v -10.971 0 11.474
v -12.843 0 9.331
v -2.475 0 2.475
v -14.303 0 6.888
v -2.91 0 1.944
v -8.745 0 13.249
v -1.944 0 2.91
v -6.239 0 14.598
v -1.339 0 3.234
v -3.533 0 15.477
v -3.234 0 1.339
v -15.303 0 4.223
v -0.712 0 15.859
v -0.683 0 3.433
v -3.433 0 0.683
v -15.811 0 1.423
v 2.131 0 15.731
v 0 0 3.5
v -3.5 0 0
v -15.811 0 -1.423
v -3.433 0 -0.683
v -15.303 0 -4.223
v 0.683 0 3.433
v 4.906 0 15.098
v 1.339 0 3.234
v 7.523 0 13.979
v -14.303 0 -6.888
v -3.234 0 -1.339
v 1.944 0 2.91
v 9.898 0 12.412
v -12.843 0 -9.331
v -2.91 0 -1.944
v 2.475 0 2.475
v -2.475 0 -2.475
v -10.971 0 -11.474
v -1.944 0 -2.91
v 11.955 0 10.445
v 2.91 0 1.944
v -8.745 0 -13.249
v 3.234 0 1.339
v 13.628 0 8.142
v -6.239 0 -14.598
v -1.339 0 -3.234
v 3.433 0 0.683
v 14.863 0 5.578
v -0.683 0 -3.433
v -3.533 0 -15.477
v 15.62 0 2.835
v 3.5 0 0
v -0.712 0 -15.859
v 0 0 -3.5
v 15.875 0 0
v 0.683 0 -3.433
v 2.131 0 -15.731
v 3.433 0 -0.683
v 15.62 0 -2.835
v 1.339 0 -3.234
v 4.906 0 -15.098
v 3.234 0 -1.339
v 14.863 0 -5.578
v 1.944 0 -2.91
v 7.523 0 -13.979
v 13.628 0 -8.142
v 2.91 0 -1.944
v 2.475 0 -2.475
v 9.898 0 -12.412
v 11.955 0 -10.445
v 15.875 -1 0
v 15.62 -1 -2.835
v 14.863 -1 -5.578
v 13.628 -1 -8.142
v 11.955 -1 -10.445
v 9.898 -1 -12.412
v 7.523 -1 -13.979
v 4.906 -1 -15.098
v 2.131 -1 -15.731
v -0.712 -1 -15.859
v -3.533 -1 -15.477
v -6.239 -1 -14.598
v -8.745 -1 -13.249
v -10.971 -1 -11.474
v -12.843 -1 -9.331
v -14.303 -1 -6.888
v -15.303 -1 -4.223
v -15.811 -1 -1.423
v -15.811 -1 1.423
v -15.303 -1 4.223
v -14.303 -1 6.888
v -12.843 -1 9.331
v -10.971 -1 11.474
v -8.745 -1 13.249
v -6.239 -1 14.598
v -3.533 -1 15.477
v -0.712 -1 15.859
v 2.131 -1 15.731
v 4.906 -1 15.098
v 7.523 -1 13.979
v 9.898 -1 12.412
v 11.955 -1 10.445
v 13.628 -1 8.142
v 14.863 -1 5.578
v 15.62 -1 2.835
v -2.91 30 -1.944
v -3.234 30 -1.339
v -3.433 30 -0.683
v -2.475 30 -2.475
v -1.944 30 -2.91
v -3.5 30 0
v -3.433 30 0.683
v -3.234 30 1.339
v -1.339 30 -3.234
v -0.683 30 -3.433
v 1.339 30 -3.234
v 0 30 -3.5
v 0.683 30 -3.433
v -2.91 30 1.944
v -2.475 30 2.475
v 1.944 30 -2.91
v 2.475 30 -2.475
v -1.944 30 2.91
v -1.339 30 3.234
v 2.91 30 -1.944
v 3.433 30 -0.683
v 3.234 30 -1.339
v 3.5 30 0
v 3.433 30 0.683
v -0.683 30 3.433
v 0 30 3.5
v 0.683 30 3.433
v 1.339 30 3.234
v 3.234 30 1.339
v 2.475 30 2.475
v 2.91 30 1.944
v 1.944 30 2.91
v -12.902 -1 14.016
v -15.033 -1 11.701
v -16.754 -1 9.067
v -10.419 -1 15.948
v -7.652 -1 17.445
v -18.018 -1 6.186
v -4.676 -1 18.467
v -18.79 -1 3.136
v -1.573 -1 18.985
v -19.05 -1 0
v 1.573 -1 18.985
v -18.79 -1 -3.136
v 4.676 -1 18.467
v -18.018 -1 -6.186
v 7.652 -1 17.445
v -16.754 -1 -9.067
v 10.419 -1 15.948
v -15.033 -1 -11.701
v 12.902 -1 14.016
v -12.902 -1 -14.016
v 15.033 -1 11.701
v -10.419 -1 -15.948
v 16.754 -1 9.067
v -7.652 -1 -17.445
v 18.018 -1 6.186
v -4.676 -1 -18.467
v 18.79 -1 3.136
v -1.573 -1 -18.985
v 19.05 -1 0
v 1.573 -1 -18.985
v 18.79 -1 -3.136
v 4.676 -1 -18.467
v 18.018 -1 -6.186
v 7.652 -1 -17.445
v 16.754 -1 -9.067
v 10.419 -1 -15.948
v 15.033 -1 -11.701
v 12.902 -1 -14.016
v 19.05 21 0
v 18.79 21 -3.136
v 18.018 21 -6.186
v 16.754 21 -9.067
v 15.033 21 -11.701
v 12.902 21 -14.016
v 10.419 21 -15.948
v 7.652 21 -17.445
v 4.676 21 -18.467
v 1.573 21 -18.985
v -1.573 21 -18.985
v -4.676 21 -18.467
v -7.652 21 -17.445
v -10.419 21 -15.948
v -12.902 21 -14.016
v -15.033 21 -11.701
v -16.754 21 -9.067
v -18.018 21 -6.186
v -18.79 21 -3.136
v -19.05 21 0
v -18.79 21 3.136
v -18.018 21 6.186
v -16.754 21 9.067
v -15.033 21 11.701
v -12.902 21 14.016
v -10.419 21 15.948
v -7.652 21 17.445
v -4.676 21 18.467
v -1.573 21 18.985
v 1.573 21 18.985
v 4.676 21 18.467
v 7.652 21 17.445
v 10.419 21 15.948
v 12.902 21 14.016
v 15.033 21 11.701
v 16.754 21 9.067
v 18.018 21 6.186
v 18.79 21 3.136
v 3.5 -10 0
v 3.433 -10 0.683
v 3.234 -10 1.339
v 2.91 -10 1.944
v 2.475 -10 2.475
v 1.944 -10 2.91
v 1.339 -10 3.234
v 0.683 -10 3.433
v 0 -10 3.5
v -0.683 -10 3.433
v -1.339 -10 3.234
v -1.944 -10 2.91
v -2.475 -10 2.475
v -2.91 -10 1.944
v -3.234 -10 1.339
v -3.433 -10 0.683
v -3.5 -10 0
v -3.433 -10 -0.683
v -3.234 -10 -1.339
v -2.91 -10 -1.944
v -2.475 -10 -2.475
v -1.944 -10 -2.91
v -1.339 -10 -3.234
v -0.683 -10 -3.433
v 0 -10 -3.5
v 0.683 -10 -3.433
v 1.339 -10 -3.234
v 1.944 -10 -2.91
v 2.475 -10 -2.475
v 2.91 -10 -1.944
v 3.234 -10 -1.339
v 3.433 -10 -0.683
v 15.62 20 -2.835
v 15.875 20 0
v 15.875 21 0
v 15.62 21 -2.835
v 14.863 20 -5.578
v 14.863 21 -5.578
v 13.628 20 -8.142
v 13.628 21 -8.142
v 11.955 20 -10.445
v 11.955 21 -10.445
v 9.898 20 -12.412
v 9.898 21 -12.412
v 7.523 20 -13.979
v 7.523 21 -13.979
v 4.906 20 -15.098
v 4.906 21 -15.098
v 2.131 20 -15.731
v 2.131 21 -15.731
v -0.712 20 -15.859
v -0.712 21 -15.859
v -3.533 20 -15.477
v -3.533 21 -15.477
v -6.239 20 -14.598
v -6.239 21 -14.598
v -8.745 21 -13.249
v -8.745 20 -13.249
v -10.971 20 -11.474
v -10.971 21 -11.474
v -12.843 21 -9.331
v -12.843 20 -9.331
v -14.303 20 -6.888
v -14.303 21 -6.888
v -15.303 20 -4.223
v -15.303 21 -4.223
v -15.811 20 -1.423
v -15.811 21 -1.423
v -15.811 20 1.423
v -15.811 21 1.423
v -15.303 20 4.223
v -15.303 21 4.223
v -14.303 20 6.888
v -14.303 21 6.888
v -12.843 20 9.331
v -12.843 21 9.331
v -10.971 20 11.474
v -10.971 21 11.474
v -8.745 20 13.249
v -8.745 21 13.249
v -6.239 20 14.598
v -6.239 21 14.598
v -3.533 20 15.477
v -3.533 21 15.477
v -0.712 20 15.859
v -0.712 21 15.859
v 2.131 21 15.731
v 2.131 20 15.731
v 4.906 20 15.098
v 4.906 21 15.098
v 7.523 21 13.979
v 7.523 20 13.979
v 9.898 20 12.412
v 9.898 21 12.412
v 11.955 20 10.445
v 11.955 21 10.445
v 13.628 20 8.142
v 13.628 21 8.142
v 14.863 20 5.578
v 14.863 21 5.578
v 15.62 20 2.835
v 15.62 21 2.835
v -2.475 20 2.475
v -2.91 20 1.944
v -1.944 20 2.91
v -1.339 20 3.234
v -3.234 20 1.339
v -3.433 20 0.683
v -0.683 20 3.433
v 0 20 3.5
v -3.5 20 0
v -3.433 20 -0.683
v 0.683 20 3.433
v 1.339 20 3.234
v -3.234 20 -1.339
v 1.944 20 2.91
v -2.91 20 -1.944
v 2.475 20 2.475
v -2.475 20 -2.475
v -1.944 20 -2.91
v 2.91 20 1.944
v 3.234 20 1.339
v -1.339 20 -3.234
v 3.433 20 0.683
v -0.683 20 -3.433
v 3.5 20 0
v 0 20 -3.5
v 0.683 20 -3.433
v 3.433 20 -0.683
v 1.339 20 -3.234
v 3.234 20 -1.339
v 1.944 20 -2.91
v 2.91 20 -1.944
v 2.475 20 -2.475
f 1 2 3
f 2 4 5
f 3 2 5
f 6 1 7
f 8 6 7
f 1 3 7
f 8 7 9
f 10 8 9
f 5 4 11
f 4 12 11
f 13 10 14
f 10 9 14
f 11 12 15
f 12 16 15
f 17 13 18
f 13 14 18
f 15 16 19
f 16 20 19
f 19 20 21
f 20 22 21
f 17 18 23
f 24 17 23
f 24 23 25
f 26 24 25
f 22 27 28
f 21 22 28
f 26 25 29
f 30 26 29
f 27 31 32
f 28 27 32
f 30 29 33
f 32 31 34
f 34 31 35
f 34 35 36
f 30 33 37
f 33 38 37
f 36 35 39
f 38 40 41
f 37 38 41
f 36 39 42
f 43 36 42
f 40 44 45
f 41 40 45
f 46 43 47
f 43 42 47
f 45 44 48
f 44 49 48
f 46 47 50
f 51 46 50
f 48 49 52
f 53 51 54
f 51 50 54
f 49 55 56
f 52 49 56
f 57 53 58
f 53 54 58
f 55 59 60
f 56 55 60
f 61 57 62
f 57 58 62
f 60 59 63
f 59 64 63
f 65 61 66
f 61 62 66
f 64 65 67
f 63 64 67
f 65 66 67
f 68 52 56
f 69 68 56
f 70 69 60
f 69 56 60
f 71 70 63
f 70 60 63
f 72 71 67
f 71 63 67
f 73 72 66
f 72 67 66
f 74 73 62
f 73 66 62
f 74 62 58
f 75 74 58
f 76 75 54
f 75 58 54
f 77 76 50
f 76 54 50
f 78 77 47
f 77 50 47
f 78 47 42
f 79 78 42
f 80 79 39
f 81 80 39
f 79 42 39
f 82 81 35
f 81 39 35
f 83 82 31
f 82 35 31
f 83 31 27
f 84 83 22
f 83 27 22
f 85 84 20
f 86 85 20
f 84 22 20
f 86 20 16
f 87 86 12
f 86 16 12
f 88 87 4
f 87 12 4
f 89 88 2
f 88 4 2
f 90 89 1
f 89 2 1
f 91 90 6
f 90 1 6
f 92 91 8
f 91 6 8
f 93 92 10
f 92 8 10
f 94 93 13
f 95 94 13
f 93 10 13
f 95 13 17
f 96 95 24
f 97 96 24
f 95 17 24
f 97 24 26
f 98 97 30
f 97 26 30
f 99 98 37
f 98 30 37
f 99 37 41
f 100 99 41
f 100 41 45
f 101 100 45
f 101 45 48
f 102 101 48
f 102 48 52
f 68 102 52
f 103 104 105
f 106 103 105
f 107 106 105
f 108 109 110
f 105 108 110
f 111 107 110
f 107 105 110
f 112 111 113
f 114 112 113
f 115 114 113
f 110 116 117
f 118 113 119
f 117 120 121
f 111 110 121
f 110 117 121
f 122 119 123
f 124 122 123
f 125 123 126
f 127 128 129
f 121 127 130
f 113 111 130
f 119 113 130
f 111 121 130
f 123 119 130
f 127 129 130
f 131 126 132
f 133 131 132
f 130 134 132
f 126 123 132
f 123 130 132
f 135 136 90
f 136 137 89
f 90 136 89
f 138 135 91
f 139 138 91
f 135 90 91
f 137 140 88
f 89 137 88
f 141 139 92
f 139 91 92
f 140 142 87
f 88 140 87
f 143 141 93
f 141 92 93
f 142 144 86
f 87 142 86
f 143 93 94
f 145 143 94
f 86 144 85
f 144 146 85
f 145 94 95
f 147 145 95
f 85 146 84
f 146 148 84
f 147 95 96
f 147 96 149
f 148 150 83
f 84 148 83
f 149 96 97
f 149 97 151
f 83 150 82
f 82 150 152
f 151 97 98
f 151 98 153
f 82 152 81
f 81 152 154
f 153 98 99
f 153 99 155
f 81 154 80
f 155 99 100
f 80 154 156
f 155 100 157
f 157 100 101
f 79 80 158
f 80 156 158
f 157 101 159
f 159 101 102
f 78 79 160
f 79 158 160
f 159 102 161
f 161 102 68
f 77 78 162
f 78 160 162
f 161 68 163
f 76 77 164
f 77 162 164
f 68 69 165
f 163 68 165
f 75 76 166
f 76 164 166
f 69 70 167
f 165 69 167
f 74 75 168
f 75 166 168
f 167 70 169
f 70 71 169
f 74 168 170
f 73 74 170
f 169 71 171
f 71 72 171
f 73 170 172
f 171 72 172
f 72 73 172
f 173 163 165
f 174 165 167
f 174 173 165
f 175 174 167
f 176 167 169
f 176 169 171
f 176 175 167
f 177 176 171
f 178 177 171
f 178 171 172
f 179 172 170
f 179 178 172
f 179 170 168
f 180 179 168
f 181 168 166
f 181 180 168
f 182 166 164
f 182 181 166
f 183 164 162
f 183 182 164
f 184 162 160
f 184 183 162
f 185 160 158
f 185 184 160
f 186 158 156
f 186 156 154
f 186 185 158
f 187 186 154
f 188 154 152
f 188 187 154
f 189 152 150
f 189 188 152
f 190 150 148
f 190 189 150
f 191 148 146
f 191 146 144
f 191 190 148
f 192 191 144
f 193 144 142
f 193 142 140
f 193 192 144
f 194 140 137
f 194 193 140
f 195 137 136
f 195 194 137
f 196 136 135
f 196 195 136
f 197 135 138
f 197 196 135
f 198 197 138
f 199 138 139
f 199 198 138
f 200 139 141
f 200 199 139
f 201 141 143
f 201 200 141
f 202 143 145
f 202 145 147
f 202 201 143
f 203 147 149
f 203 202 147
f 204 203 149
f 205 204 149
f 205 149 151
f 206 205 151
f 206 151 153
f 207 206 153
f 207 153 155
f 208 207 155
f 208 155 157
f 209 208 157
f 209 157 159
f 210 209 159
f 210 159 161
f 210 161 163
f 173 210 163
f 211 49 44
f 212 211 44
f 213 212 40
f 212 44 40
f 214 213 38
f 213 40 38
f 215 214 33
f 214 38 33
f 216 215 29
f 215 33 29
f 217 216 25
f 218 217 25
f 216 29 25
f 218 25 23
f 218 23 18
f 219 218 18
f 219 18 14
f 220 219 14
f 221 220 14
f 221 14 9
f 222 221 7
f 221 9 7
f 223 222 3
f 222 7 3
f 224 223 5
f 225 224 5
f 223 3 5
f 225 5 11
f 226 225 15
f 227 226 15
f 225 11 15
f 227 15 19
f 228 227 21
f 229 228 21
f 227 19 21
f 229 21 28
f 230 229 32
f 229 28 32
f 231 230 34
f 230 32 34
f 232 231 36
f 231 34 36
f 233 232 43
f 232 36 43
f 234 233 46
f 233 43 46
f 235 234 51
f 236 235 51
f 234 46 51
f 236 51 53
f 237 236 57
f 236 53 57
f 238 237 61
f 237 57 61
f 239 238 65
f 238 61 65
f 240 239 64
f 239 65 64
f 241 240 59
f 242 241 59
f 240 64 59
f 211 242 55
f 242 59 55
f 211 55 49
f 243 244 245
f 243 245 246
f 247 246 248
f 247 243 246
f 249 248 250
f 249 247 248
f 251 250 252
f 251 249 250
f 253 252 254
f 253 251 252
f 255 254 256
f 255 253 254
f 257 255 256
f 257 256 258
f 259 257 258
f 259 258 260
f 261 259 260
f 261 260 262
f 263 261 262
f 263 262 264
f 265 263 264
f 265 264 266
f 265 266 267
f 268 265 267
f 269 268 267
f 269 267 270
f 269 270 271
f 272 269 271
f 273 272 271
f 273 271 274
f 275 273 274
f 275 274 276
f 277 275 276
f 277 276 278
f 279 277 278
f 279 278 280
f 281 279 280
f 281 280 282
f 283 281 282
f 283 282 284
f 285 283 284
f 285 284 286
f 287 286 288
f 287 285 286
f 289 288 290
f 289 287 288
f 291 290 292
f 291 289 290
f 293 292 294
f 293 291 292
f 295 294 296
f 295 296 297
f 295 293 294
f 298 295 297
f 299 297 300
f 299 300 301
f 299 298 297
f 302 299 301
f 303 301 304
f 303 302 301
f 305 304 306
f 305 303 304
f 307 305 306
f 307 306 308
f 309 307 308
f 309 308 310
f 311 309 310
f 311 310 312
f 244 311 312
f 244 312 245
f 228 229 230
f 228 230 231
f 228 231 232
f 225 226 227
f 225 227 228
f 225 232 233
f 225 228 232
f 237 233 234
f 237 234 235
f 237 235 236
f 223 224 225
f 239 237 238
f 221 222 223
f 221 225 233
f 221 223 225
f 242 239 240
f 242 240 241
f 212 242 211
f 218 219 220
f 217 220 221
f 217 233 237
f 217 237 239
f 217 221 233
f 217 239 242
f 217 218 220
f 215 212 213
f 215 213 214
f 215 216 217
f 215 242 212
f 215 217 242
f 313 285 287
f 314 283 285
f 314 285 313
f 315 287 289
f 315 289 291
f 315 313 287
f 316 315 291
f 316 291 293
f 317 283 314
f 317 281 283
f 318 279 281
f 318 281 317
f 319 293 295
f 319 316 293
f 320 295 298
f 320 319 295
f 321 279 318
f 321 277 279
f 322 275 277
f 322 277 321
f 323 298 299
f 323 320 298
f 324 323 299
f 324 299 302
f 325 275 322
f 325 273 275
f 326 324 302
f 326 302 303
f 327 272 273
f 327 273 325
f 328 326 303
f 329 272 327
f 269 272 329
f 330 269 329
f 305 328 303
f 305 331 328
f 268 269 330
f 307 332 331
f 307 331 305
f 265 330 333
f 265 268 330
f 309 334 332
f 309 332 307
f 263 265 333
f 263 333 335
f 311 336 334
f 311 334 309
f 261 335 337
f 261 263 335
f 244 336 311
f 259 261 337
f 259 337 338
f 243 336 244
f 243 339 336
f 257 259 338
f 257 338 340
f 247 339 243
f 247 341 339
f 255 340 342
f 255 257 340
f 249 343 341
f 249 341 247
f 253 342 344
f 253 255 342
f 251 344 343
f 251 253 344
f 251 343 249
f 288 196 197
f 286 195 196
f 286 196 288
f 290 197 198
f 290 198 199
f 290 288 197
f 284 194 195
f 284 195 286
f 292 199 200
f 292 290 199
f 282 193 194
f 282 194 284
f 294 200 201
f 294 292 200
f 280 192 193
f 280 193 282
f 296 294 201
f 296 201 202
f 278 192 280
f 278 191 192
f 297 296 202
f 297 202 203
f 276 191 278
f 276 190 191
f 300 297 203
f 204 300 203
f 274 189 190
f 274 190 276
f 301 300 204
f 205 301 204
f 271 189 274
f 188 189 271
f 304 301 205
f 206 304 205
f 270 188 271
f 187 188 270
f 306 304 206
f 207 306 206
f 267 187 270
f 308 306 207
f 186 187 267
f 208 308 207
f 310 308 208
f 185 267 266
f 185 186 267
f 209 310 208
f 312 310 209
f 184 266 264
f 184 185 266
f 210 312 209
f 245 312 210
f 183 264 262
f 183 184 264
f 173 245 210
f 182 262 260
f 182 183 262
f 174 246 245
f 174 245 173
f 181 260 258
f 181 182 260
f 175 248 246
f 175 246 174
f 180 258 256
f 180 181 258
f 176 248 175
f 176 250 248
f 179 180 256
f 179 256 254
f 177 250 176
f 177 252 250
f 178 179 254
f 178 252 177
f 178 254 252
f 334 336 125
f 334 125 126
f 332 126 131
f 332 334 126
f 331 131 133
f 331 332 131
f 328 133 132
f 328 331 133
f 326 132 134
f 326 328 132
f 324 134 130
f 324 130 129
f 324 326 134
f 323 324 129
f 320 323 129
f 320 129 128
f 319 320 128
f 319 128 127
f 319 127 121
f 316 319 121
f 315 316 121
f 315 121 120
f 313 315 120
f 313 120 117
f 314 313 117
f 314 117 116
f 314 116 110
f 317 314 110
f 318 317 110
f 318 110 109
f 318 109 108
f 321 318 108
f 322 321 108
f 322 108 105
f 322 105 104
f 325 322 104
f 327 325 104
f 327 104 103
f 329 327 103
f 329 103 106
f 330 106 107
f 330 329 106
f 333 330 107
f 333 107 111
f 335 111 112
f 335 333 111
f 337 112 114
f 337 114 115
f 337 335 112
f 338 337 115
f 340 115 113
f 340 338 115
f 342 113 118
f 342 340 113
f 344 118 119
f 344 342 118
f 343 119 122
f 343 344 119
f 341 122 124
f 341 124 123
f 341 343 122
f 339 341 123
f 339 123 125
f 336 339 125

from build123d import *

# Parameters (mm, degrees)
SKETCH1_R                = 15.875
BOSS_EXTRUDE1_DEPTH      = 20
SKETCH2_R                = 3.5
BOSS_EXTRUDE2_DEPTH      = 10
BOSS_EXTRUDE2_DEPTH_BACK = 30
SKETCH3_R                = 19.05
SKETCH3_R_2              = 15.875
BOSS_EXTRUDE3_DEPTH      = 21
BOSS_EXTRUDE3_DEPTH_BACK = 1


with BuildPart() as part:
    # Sketch1 → Boss-Extrude1 (new body)
    with BuildSketch(Plane(origin=(0, 0, 0), x_dir=(1, 0, 0), z_dir=(0, 1, 0))):
        Circle(SKETCH1_R)
    extrude(amount=BOSS_EXTRUDE1_DEPTH)

    # Sketch2 → Boss-Extrude2 (add, two sides)
    with BuildSketch(Plane.XZ) as boss_extrude2_sk:
        Circle(SKETCH2_R)
    extrude(amount=BOSS_EXTRUDE2_DEPTH)
    extrude(boss_extrude2_sk.sketch, amount=-BOSS_EXTRUDE2_DEPTH_BACK)

    # Sketch3 → Boss-Extrude3 (add, two sides)
    with BuildSketch(Plane(origin=(0, 0, 0), x_dir=(1, 0, 0), z_dir=(0, 1, 0))) as boss_extrude3_sk:
        Circle(SKETCH3_R)
        Circle(SKETCH3_R_2, mode=Mode.SUBTRACT)
    extrude(amount=BOSS_EXTRUDE3_DEPTH)
    extrude(boss_extrude3_sk.sketch, amount=-BOSS_EXTRUDE3_DEPTH_BACK)


solid = part.part
